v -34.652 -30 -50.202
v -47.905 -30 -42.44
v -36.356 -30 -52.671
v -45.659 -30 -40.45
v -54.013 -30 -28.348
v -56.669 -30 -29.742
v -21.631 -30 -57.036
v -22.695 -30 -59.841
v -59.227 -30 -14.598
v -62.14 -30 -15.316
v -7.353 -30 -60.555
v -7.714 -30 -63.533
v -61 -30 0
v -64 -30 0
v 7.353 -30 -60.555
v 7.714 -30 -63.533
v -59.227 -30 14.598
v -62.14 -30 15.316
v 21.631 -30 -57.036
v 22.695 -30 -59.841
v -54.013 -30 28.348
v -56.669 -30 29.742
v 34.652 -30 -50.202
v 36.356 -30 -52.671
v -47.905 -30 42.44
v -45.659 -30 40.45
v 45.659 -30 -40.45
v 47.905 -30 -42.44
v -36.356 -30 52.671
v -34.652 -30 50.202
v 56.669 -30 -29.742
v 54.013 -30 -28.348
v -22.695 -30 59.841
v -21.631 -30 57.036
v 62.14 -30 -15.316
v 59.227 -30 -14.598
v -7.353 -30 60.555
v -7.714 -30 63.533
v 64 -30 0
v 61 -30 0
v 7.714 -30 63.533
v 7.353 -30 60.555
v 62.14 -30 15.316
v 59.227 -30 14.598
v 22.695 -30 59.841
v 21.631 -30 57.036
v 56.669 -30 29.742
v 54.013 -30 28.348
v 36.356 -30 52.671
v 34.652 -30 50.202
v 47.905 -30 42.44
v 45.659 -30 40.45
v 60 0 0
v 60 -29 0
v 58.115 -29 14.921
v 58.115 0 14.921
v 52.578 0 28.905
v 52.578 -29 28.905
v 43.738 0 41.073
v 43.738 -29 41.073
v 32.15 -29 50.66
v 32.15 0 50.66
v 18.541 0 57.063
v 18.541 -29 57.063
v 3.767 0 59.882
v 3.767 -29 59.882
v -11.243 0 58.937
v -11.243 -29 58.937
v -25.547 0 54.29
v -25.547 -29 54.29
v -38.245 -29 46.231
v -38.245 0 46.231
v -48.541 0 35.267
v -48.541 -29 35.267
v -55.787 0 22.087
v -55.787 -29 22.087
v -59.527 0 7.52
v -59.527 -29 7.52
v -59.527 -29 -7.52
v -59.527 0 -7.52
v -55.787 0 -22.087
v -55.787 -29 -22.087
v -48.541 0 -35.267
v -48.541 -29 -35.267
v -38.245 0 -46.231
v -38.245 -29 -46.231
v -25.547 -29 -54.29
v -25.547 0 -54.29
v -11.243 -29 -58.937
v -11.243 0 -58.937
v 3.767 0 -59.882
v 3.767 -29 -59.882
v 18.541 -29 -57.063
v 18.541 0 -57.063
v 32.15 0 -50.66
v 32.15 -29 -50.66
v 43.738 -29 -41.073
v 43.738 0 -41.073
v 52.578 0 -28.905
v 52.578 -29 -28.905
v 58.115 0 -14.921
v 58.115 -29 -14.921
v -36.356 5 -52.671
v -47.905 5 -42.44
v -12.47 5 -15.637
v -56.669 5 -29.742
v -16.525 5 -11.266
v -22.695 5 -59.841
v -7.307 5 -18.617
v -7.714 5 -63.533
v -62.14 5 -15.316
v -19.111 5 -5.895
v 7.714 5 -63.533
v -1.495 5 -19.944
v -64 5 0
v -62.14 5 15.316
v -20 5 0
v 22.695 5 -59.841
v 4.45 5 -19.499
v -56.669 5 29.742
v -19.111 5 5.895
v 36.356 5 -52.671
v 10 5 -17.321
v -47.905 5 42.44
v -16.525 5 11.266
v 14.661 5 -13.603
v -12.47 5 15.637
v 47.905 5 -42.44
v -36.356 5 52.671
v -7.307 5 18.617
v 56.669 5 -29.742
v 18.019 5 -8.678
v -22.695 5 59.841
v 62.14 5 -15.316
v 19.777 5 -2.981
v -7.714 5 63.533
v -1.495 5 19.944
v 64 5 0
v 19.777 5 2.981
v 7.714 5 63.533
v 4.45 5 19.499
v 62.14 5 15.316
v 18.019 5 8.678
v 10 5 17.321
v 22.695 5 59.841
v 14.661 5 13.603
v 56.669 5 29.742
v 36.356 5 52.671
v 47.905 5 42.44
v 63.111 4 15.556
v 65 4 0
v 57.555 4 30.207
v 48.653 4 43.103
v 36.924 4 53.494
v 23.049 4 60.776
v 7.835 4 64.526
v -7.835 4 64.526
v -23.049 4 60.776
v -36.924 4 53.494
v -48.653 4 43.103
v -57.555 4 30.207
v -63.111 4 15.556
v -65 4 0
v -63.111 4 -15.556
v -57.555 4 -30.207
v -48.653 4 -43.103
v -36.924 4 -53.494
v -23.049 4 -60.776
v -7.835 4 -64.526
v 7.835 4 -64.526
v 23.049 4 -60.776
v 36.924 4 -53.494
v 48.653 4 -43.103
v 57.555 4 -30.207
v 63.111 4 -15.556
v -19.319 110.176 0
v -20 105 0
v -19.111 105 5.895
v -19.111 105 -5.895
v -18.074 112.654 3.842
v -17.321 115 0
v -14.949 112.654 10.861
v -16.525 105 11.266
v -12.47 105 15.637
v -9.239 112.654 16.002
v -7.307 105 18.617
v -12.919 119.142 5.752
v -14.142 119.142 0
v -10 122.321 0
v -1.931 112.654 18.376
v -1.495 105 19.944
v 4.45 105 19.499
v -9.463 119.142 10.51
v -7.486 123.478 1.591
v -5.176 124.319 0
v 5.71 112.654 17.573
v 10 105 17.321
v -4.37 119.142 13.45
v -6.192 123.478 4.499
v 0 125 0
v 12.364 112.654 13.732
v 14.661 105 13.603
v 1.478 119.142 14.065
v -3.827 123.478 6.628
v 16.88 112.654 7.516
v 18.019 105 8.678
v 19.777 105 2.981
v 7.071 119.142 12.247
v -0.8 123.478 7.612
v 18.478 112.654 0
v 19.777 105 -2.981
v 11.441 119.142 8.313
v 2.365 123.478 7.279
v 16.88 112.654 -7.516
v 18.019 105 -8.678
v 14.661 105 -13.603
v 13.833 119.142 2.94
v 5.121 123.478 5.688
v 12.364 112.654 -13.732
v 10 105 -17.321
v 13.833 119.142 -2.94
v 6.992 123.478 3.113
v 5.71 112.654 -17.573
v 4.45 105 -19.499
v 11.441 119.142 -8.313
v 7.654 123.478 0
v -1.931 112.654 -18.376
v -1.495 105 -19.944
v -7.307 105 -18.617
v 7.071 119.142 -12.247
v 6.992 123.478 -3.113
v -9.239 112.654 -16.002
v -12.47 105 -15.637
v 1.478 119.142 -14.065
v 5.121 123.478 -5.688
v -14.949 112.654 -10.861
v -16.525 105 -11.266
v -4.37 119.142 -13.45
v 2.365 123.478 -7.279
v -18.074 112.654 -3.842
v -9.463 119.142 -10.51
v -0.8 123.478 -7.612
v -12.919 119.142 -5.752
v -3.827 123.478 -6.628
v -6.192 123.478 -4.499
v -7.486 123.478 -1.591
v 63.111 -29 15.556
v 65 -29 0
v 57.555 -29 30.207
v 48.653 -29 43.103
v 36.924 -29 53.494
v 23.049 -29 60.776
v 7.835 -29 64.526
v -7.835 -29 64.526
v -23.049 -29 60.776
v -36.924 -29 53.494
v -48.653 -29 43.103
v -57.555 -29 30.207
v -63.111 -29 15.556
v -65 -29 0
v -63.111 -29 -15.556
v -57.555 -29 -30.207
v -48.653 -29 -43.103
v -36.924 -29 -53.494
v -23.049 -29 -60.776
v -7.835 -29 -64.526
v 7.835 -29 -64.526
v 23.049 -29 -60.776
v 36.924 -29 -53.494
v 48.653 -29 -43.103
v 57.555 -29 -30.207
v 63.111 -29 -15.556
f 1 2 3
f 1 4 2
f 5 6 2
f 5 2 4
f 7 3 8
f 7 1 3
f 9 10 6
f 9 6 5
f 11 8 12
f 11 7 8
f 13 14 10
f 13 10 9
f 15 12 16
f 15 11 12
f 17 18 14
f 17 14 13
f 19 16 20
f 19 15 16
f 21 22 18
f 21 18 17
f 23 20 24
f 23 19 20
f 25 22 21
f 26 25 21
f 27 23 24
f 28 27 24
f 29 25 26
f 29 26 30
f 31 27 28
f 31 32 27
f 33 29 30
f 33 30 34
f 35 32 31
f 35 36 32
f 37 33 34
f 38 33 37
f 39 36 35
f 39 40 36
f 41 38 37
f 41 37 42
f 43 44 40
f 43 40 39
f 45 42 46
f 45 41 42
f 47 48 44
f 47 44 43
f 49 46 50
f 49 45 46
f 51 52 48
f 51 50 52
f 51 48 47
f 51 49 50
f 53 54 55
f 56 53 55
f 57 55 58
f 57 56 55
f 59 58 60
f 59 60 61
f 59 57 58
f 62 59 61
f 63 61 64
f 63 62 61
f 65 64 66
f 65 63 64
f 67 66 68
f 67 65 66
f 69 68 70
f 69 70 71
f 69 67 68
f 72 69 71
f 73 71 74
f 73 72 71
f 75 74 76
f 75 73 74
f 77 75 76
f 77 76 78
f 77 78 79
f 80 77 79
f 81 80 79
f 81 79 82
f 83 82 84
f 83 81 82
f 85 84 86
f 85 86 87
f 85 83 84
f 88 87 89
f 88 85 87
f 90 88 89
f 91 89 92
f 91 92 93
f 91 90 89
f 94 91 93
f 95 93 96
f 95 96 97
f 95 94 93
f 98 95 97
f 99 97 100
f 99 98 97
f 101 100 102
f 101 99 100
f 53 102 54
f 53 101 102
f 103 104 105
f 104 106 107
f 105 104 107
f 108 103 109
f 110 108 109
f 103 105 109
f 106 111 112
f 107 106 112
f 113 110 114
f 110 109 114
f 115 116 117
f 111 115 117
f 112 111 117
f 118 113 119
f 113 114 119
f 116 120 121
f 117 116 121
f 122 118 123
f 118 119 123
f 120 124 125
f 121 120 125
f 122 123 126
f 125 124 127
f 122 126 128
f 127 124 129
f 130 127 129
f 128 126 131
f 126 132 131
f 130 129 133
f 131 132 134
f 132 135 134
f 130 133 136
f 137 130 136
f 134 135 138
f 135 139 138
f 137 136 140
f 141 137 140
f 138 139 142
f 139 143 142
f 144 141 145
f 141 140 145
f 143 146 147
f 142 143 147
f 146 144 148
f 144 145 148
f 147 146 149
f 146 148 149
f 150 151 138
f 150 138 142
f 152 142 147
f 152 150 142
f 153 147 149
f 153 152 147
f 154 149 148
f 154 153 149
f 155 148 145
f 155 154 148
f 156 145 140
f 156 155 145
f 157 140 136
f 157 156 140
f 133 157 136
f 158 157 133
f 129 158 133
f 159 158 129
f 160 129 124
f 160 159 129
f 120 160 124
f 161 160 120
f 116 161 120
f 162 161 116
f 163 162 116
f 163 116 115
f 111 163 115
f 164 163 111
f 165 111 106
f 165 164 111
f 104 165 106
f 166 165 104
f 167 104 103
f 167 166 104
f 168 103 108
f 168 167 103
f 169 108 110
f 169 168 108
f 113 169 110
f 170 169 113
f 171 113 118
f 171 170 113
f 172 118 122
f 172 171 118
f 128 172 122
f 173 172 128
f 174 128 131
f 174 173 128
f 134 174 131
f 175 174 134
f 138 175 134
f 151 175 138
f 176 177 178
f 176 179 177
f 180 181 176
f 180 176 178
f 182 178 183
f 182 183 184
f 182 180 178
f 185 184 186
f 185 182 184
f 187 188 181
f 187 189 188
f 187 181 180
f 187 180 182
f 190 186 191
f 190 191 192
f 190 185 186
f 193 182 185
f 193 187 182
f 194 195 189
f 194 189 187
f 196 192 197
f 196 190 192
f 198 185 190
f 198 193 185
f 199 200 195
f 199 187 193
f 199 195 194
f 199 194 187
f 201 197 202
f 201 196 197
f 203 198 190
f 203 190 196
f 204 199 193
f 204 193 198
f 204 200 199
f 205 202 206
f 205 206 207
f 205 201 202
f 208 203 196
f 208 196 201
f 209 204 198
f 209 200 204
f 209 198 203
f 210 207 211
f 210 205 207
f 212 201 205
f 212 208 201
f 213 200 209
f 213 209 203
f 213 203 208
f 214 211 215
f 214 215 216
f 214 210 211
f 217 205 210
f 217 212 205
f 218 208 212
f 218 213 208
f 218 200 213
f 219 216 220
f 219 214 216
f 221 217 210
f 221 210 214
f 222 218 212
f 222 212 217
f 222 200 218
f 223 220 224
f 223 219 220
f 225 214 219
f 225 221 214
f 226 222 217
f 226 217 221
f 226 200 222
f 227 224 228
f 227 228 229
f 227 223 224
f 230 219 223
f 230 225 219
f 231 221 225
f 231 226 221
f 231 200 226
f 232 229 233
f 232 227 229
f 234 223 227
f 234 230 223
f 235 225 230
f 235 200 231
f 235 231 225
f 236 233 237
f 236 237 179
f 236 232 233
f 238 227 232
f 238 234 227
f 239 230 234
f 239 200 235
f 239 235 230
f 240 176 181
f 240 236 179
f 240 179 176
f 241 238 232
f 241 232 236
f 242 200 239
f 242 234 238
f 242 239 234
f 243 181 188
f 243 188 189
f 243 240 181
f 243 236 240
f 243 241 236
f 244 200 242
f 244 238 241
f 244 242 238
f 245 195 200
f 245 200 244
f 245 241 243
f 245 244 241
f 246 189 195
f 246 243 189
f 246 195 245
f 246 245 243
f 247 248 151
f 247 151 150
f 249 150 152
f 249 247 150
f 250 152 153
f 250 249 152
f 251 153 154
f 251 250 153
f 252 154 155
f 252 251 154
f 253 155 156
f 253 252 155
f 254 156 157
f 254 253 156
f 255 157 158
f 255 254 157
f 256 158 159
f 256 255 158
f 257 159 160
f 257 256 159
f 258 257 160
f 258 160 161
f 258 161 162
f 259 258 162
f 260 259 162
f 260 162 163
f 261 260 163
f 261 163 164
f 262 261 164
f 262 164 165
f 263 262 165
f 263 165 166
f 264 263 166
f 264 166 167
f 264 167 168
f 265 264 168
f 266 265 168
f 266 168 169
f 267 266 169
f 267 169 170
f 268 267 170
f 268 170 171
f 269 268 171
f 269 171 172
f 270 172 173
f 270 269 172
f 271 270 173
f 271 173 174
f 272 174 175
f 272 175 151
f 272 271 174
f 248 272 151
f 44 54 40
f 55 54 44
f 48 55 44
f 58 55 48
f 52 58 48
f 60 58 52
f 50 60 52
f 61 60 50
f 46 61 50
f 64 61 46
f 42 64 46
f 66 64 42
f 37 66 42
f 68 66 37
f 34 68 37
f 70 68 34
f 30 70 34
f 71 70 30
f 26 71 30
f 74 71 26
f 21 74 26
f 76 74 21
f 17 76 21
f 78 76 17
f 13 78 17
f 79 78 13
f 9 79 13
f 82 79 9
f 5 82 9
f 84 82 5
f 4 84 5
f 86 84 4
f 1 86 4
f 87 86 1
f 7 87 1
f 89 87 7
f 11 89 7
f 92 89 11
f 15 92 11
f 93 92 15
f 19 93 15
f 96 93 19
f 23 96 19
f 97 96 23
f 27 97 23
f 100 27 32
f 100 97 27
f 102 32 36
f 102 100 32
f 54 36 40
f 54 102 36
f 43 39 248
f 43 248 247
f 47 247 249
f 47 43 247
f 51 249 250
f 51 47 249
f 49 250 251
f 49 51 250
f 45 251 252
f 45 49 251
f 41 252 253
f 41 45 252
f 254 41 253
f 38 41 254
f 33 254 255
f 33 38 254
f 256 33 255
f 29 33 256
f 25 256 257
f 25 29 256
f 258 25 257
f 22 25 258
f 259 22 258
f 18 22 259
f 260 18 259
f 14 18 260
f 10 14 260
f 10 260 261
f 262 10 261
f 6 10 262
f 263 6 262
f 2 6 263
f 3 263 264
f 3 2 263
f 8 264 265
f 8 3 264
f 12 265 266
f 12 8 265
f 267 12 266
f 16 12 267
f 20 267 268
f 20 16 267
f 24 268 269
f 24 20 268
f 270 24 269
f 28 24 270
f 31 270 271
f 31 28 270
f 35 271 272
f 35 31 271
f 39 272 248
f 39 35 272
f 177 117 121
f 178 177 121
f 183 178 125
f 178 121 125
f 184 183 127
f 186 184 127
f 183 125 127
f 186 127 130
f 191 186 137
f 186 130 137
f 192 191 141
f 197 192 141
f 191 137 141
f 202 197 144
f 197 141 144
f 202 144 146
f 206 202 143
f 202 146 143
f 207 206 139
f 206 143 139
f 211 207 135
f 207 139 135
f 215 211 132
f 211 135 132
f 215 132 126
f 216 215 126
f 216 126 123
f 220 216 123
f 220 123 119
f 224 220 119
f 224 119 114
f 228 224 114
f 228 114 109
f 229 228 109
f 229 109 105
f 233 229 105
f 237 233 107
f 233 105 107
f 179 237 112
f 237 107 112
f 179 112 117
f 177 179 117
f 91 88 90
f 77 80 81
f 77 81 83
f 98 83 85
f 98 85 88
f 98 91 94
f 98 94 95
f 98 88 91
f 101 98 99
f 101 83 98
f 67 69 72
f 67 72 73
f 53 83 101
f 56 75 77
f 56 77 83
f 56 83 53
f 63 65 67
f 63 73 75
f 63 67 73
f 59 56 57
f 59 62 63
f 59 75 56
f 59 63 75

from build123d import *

# Parameters (mm, degrees)
F0_R     = 65
F1_DEPTH = 5
F2_R     = 65
F2_R_2   = 60
F3_DEPTH = 30
F4_R     = 20
F5_DEPTH = 120
F6_R     = 20
F7_SIZE  = 1


with BuildPart() as f1:
    # F0 (on Front) → F1 (new body)
    with BuildSketch(Plane.XZ):
        Circle(F0_R)
    extrude(amount=-F1_DEPTH)

    # F2 (on face) → F3 (join)
    with BuildSketch(Plane.XZ):
        Circle(F2_R)
        Circle(F2_R_2, mode=Mode.SUBTRACT)
    extrude(amount=F3_DEPTH)

    # F4 (on face) → F5 (join)
    with BuildSketch(Plane(origin=(0, 5, 0), x_dir=(-1, 0, 0), z_dir=(0, 1, 0))):
        Circle(F4_R)
    extrude(amount=F5_DEPTH)

    # F6
    f6_edges = [f1.edges().sort_by_distance(p)[0] for p in [
        (20, 125, 0),
    ]]
    fillet(f6_edges, radius=F6_R)

    # F7
    f7_edges = [f1.edges().sort_by_distance(p)[0] for p in [
        (-65, 5, 0),
        (-65, -30, 0),
        (-60, -30, 0),
    ]]
    chamfer(f7_edges, length=F7_SIZE)


solid = f1.part
